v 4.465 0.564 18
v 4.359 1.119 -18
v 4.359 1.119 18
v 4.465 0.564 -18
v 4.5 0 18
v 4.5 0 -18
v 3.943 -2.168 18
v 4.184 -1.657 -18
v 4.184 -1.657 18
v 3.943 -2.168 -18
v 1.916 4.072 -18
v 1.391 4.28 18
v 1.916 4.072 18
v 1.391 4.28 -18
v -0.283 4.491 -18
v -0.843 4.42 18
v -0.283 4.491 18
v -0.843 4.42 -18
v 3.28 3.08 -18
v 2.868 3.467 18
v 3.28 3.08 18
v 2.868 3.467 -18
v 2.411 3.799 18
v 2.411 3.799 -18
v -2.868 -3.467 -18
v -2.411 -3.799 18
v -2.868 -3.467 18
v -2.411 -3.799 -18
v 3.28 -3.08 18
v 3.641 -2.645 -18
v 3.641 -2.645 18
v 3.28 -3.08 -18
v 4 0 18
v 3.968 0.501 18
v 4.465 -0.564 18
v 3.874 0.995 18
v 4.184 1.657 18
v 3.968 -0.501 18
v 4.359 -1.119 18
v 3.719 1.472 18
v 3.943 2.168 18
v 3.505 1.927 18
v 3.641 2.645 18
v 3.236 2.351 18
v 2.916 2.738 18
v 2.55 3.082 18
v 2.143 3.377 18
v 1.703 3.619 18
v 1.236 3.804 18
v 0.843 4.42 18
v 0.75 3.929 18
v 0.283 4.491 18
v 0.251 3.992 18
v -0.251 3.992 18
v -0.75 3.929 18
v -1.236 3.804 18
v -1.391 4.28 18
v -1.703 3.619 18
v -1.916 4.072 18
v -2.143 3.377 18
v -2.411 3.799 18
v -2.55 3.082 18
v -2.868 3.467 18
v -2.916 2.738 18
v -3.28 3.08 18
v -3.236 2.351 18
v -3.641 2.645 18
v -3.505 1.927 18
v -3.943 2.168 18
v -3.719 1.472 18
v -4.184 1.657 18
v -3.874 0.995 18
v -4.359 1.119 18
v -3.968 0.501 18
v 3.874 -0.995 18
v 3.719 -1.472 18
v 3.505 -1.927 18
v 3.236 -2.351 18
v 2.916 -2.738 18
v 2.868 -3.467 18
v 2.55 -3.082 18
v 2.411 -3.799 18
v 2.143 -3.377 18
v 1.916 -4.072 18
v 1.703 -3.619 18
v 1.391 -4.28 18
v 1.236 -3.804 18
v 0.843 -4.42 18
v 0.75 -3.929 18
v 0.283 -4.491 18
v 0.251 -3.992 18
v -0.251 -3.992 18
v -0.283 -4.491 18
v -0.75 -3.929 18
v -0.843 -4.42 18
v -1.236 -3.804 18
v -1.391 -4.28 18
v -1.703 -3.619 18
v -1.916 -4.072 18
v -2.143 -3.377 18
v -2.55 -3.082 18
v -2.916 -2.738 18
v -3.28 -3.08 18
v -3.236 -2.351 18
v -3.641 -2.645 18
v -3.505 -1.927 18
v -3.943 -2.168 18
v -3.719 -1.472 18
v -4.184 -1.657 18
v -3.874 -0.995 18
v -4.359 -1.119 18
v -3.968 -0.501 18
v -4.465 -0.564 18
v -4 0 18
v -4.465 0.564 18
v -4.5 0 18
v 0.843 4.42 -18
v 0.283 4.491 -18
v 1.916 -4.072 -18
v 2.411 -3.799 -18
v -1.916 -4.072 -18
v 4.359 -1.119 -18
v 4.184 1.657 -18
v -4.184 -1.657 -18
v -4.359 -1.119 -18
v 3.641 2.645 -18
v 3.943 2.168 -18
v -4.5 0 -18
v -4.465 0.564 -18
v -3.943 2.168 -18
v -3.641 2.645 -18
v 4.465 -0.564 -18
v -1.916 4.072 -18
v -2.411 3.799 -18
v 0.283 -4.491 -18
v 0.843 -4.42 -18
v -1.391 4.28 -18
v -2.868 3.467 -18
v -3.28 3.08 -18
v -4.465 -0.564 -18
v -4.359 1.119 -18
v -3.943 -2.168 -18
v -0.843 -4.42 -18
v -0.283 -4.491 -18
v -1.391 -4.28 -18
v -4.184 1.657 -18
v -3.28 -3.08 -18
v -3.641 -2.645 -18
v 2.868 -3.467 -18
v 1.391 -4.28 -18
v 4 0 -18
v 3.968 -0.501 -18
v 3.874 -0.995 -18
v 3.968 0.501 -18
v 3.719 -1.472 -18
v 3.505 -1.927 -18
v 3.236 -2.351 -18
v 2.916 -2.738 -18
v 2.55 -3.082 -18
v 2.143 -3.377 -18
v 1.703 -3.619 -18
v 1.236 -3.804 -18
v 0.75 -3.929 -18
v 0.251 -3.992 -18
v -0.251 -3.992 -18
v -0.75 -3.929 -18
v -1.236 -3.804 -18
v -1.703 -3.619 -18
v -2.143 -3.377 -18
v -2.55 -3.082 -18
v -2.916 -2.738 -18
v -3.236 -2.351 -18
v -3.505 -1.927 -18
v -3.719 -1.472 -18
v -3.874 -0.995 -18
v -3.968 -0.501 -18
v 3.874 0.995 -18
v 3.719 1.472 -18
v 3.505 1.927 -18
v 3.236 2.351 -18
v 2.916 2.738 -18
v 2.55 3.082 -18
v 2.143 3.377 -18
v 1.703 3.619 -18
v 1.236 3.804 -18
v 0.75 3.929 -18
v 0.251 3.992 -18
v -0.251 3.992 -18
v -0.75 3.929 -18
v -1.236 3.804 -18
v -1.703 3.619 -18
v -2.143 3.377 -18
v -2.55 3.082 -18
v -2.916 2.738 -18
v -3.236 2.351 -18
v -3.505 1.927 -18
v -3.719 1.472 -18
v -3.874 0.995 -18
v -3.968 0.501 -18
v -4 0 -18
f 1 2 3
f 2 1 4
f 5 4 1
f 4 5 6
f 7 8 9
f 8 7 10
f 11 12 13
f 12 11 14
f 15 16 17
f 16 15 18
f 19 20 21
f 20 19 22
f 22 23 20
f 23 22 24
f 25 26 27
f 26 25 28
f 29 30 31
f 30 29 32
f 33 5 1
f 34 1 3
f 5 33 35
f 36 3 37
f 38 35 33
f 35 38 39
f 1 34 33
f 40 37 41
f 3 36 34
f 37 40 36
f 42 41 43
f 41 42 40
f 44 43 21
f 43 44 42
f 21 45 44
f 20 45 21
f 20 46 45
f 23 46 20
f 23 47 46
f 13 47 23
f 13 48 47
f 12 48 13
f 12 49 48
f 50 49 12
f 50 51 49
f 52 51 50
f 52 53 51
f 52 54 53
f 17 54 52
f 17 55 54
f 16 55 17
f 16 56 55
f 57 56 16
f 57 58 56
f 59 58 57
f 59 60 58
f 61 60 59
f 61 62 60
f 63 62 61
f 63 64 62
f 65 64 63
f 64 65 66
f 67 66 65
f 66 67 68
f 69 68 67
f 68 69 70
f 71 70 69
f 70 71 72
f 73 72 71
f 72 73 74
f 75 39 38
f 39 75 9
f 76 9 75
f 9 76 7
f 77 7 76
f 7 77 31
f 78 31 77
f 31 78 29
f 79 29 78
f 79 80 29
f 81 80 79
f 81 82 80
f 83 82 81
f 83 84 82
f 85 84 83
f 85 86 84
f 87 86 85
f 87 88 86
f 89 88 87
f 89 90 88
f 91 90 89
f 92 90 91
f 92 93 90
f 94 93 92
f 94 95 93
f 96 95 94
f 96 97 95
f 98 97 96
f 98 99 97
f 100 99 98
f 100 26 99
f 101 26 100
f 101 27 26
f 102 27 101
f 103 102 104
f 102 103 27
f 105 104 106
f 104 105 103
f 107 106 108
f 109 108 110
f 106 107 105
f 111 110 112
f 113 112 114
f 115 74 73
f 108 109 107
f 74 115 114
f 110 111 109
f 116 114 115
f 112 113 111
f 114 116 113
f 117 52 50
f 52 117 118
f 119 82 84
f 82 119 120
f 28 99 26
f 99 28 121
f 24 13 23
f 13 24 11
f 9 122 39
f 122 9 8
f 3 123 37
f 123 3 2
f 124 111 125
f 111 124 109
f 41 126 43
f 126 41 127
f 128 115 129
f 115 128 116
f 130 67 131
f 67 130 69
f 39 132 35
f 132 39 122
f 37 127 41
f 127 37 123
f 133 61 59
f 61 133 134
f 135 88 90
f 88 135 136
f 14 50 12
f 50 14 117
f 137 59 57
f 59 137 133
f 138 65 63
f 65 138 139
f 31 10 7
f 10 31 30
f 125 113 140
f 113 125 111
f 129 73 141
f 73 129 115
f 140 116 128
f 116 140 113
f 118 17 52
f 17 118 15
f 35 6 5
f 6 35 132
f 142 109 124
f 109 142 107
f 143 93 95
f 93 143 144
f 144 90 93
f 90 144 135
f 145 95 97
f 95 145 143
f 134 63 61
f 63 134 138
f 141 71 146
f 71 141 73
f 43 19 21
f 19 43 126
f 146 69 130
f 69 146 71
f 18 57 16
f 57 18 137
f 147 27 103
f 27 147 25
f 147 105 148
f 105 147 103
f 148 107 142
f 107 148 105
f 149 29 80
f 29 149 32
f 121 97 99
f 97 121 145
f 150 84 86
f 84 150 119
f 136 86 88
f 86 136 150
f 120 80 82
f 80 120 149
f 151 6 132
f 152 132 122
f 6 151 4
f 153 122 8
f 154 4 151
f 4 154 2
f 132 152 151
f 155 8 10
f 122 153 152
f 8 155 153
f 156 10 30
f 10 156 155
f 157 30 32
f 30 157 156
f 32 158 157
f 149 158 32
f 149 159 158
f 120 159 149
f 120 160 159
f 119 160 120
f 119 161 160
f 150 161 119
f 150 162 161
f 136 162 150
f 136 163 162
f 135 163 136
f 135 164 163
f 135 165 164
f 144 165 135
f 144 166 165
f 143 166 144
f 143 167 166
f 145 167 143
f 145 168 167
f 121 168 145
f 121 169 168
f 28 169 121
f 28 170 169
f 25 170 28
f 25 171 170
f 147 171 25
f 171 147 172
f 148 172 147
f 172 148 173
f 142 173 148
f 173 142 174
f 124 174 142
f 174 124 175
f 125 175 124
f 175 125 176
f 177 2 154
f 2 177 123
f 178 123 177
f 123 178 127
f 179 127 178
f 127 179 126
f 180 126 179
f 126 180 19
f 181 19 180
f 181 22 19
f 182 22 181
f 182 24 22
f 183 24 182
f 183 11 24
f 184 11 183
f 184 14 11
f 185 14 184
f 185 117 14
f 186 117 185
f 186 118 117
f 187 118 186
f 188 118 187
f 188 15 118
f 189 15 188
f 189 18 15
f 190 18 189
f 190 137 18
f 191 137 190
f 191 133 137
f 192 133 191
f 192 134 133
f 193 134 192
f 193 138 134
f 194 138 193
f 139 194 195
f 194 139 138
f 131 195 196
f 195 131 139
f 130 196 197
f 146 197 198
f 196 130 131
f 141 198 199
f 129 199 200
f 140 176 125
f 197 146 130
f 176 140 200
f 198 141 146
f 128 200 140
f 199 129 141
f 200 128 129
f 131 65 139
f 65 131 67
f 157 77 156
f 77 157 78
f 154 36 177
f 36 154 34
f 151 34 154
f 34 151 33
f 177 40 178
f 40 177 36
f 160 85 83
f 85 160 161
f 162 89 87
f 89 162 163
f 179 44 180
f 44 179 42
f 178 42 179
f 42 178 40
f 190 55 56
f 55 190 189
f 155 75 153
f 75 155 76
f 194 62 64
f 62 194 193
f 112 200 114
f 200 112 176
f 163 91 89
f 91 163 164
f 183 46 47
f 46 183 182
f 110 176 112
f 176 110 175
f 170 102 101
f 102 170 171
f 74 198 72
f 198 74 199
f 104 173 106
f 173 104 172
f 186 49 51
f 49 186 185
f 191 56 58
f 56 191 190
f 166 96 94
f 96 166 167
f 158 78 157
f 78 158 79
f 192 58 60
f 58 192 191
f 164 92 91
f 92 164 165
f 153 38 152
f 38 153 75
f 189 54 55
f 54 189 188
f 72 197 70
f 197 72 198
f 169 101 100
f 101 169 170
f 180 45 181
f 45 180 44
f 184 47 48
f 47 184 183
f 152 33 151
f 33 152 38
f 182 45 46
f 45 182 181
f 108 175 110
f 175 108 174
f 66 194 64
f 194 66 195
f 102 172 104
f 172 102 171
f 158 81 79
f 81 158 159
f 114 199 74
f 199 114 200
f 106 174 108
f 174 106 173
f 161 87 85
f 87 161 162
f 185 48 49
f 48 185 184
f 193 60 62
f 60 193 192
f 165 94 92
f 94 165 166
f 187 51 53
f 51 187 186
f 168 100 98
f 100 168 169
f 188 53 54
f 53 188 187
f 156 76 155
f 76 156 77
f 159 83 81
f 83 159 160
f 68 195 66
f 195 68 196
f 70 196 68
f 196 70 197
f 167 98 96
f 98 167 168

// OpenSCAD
$fn = 50;


difference() {
	union() {
		translate(v = [0, 0, -18.0000000000]) {
			cylinder(h = 36, r = 4.5000000000);
		}
	}
	union() {
		translate(v = [0, 0, -100.0000000000]) {
			cylinder(h = 200, r = 4.0000000000);
		}
	}
}
